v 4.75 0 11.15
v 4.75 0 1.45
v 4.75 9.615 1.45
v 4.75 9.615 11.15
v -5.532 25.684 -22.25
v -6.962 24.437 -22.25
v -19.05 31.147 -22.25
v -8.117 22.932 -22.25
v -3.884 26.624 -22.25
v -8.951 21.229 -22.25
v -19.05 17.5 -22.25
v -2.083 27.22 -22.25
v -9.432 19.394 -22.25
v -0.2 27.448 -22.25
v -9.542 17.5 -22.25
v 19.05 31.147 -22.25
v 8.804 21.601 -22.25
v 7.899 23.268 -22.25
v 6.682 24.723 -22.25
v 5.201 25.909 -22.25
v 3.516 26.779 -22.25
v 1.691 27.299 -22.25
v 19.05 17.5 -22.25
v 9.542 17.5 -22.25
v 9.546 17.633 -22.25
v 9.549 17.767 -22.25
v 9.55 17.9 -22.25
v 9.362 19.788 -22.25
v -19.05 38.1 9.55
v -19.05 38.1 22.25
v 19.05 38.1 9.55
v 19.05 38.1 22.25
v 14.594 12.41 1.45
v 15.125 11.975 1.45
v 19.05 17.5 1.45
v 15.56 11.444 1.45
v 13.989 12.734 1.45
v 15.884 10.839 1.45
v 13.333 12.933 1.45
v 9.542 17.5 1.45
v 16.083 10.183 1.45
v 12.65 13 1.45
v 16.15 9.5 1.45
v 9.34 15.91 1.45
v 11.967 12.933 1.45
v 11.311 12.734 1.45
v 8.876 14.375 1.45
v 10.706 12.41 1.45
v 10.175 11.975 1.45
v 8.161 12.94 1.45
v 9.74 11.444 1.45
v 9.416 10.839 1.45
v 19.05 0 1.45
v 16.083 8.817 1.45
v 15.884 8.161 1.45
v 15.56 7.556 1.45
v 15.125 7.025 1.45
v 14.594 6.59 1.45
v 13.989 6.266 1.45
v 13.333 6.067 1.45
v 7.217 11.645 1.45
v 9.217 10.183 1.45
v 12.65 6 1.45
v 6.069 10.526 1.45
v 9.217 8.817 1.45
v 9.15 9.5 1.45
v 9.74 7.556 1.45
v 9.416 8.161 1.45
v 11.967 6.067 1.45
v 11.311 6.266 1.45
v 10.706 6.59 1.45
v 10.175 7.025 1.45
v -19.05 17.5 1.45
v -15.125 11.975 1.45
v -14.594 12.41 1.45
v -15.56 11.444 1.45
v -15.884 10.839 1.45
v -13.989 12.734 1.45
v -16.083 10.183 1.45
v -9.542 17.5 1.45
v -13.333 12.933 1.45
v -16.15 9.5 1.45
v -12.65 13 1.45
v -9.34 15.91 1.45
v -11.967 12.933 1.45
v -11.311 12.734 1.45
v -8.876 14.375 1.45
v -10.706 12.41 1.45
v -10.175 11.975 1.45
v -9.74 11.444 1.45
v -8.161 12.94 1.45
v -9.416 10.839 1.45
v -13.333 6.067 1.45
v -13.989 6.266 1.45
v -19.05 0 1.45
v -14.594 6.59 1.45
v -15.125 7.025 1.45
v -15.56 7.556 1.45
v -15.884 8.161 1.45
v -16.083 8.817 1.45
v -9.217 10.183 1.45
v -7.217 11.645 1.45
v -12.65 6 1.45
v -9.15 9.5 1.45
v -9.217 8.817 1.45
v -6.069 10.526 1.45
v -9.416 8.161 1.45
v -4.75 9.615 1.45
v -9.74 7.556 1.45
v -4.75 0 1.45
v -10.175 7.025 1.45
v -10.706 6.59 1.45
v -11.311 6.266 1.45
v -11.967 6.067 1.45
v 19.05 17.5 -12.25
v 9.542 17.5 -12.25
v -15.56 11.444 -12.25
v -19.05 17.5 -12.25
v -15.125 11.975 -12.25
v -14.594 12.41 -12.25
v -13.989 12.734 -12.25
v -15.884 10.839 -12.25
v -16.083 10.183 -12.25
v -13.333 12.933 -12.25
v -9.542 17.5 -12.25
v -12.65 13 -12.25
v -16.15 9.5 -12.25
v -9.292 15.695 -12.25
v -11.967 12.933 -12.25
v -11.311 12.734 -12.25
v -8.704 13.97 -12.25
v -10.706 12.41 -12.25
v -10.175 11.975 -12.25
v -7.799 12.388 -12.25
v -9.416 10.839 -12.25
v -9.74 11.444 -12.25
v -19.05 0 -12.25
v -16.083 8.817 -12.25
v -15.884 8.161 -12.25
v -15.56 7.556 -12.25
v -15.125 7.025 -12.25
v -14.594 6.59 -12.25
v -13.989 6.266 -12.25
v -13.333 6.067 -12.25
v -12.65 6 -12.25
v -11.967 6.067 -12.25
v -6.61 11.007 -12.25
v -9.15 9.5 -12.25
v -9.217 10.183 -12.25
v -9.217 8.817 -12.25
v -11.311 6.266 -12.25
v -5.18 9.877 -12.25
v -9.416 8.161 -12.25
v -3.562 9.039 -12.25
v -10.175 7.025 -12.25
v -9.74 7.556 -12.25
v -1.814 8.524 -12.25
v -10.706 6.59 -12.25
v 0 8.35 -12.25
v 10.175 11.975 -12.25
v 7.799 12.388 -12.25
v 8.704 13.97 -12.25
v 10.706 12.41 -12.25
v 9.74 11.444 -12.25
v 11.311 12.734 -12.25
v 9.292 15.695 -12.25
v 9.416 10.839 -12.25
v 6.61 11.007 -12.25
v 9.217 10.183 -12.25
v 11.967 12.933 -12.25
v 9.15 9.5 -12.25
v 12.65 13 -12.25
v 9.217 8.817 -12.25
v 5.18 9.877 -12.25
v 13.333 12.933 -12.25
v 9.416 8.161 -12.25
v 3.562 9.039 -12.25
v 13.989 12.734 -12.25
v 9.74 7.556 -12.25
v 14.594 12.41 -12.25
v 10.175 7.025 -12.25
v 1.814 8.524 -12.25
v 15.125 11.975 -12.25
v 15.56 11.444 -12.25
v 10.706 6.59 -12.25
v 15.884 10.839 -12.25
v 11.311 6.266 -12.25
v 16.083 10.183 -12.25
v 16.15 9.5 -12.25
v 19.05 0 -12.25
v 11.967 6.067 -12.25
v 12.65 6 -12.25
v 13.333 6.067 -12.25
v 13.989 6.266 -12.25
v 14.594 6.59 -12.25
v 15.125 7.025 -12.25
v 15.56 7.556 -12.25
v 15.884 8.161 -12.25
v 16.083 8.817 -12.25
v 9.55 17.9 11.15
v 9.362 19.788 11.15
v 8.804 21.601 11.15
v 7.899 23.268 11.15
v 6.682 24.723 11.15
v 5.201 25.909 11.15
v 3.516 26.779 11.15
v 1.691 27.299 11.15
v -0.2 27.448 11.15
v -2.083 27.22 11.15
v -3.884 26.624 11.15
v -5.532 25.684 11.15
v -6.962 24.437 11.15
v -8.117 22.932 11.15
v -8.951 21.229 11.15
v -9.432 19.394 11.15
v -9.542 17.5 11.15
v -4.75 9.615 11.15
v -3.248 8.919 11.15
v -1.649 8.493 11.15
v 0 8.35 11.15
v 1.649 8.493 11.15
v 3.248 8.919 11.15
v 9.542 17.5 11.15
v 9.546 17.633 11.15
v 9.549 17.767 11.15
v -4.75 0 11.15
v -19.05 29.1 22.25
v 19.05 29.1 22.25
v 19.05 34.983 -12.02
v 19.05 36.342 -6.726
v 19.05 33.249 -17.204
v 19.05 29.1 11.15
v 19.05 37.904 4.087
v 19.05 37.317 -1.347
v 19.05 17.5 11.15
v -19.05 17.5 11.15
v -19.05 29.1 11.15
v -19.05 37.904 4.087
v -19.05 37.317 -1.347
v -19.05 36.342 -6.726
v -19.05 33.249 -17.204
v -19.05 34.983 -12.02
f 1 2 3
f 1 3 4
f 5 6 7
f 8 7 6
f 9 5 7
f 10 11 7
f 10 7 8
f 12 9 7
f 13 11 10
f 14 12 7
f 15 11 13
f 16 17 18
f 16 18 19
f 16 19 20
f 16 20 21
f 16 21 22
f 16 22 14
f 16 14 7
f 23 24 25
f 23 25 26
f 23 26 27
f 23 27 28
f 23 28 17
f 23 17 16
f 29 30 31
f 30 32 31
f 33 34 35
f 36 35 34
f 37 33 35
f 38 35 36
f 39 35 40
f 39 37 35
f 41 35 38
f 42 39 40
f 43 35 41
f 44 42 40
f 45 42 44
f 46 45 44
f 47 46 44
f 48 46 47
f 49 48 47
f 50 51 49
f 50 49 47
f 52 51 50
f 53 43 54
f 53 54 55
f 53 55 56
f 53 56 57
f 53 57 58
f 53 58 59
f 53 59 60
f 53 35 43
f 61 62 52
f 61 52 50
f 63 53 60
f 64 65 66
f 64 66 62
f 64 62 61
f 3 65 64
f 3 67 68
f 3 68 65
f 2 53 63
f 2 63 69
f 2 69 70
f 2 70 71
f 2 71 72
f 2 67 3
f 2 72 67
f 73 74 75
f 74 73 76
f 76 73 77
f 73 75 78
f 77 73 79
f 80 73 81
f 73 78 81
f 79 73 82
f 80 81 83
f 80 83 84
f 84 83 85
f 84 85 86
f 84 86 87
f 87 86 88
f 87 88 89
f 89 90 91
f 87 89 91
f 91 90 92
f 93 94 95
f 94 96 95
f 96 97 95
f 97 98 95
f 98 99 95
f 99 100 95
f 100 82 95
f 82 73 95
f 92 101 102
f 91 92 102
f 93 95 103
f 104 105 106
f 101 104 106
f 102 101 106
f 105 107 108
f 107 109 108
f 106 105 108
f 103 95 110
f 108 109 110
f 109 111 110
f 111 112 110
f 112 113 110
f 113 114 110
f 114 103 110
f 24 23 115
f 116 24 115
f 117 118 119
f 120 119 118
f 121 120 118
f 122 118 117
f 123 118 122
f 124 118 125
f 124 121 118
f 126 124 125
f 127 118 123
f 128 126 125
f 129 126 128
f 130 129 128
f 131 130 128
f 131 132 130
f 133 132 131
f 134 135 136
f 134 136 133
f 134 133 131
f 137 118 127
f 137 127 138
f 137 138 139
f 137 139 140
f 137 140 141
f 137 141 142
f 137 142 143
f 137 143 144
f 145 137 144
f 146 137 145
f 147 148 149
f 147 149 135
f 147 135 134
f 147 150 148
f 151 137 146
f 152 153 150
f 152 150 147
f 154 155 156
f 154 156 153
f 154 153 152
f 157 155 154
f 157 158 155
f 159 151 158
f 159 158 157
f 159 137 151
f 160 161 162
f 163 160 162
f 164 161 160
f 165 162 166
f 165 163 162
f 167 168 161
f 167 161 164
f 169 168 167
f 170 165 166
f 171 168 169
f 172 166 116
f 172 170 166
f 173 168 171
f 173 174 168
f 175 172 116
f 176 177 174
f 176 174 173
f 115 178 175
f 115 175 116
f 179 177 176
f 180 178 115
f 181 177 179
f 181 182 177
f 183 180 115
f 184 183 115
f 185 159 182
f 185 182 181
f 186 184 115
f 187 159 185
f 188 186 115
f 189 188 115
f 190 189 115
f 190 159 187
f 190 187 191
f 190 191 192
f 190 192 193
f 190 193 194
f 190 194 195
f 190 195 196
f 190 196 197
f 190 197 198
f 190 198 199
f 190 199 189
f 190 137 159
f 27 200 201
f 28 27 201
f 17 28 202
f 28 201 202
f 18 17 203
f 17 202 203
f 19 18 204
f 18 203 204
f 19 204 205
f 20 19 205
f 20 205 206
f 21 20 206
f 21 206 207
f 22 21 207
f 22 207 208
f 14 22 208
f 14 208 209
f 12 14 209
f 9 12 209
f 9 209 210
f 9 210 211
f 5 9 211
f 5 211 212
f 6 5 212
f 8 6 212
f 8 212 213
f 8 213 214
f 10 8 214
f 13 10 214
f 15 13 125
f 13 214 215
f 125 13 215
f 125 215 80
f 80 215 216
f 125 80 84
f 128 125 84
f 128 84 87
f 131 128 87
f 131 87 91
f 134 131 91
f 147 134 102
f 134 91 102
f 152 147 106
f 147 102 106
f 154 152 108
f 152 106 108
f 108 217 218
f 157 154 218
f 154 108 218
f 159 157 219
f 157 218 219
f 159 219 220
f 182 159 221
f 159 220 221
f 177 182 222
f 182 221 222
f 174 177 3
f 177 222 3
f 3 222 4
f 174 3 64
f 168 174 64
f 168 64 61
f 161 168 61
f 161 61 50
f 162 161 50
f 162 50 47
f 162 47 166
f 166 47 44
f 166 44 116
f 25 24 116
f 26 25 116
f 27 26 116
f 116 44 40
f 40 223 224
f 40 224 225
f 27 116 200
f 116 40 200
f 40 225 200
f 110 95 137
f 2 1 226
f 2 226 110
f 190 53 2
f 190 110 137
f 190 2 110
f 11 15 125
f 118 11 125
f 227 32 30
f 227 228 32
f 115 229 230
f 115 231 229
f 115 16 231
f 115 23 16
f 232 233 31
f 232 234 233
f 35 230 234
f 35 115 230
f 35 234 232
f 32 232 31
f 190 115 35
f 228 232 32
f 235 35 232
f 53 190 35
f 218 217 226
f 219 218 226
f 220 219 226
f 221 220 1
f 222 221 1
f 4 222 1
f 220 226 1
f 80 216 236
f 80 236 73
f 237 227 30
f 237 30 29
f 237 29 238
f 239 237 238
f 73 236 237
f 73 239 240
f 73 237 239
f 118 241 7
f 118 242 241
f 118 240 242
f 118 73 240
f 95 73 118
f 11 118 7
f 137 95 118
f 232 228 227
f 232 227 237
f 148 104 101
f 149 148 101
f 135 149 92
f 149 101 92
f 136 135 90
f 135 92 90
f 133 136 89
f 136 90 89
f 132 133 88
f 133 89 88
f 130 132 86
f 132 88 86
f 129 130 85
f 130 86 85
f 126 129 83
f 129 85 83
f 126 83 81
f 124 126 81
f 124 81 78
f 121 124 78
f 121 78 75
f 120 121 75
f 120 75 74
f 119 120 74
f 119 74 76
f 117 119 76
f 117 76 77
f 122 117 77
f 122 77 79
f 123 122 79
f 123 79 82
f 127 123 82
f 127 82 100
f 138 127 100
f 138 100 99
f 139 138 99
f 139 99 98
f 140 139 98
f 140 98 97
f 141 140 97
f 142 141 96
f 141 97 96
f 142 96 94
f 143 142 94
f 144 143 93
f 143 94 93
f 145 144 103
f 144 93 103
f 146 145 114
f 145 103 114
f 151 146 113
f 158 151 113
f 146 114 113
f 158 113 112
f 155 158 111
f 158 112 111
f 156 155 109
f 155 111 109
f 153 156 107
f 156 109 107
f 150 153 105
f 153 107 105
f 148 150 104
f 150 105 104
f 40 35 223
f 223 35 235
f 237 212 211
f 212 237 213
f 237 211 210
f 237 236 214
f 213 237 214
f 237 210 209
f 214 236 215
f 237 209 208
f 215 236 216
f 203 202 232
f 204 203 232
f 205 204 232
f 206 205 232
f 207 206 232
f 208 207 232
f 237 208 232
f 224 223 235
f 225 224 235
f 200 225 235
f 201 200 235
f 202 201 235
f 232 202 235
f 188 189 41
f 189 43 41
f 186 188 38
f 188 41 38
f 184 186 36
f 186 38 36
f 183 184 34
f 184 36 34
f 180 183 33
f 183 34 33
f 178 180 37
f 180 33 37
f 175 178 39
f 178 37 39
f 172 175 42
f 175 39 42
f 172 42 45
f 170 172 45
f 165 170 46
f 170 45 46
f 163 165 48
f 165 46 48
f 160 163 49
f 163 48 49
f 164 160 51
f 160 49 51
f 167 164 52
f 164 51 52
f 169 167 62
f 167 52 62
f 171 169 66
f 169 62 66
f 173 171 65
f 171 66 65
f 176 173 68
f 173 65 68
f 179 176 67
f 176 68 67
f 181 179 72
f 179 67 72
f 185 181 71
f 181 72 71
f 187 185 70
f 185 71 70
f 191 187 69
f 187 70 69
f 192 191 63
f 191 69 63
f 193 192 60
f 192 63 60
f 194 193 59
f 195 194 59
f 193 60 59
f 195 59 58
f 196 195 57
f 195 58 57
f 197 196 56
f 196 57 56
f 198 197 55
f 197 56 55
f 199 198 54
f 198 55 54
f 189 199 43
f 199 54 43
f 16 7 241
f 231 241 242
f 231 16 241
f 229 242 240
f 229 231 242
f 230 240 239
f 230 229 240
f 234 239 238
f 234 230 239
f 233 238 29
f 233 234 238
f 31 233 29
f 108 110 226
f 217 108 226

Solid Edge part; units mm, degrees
sketch "Sketch1" plane through (0, 0, 0) normal (0, -1, 0) x (1, 0, 0)
  line L0 (-19.05, -22.25) -> (19.05, -22.25)
  line L1 (19.05, -22.25) -> (19.05, 22.25)
  line L2 (19.05, 22.25) -> (-19.05, 22.25)
  line L3 (-19.05, 22.25) -> (-19.05, -22.25)
extrude "Protrusion1" add sketch "Sketch1" against normal blind 38.1
sketch "Sketch2" plane through (0, 0, 0) normal (0, -1, 0) x (1, 0, 0)
  line L0 (-19.05, 22.25) -> (-19.05, 11.15)
  line L1 (-19.05, 11.15) -> (19.05, 11.15)
  line L2 (19.05, 11.15) -> (19.05, 22.25)
  line L3 (19.05, 22.25) -> (-19.05, 22.25)
extrude "ExtrudedCutout_2" cut sketch "Sketch2" against normal blind 29.1
sketch "Sketch3" plane through (0, 0, -5.55) normal (0, -1, 0) x (1, 0, 0)
  line L0 (-19.05, 16.7) -> (-19.05, 7)
  line L1 (-19.05, 7) -> (-4.75, 7)
  line L2 (-4.75, 7) -> (-4.75, 16.7)
  line L3 (-4.75, 16.7) -> (-19.05, 16.7)
extrude "ExtrudedCutout_3" cut sketch "Sketch3" against normal blind 17.5
sketch "Sketch4" plane through (0, 0, -5.55) normal (0, -1, 0) x (1, 0, 0)
  line L0 (19.05, 16.7) -> (19.05, 7)
  line L1 (19.05, 7) -> (4.75, 7)
  line L2 (4.75, 7) -> (4.75, 16.7)
  line L3 (4.75, 16.7) -> (19.05, 16.7)
extrude "ExtrudedCutout_4" cut sketch "Sketch4" against normal blind 17.5
sketch "Sketch5" plane through (0, 0, 0) normal (0, -1, 0) x (1, 0, 0)
  line L0 (-19.05, -22.25) -> (-19.05, -12.25)
  line L1 (-19.05, -12.25) -> (19.05, -12.25)
  line L2 (19.05, -12.25) -> (19.05, -22.25)
  line L3 (19.05, -22.25) -> (-19.05, -22.25)
extrude "ExtrudedCutout_8" cut sketch "Sketch5" against normal blind 17.5
sketch "Sketch6" plane through (0, 0, 0) normal (0, 0, 1) x (1, 0, 0)
  circle A0 centre (-12.65, 9.5) radius 3.5
  circle A1 centre (12.65, 9.5) radius 3.5
extrude "Cutout1" cut sketch "Sketch6" against normal up to vertex (12.25 mm away)
sketch "Sketch7" plane through (0, 0, 0) normal (0, 0, 1) x (1, 0, 0)
  circle A0 centre (-12.65, 9.5) radius 3.5
extrude "Cutout2" cut sketch "Sketch7" along normal blind 20
sketch "Sketch8" plane through (0, 0, 0) normal (0, 0, 1) x (1, 0, 0)
  circle A0 centre (12.65, 9.5) radius 3.5
extrude "ExtrudedCutout_16" cut sketch "Sketch8" along normal blind 20
sketch "Sketch9" plane through (19.05, 19.05, 0) normal (1, 0, 0) x (0, 1, 0)
  arc A0 (19.05, 9.55) -> (12.0974, -22.25) centre (-57.15, 9.55) cw
  line L0 (12.0974, -22.25) -> (19.05, -22.25)
  line L1 (19.05, -22.25) -> (19.05, 9.55)
extrude "ExtrudedCutout_17" cut sketch "Sketch9" against normal blind 40
sketch "Sketch10" plane through (0, 14.55, 11.15) normal (0, 0, 1) x (1, 0, 0)
  circle A0 centre (0, 3.35) radius 9.55
extrude "Cutout3" cut sketch "Sketch10" against normal blind 98
